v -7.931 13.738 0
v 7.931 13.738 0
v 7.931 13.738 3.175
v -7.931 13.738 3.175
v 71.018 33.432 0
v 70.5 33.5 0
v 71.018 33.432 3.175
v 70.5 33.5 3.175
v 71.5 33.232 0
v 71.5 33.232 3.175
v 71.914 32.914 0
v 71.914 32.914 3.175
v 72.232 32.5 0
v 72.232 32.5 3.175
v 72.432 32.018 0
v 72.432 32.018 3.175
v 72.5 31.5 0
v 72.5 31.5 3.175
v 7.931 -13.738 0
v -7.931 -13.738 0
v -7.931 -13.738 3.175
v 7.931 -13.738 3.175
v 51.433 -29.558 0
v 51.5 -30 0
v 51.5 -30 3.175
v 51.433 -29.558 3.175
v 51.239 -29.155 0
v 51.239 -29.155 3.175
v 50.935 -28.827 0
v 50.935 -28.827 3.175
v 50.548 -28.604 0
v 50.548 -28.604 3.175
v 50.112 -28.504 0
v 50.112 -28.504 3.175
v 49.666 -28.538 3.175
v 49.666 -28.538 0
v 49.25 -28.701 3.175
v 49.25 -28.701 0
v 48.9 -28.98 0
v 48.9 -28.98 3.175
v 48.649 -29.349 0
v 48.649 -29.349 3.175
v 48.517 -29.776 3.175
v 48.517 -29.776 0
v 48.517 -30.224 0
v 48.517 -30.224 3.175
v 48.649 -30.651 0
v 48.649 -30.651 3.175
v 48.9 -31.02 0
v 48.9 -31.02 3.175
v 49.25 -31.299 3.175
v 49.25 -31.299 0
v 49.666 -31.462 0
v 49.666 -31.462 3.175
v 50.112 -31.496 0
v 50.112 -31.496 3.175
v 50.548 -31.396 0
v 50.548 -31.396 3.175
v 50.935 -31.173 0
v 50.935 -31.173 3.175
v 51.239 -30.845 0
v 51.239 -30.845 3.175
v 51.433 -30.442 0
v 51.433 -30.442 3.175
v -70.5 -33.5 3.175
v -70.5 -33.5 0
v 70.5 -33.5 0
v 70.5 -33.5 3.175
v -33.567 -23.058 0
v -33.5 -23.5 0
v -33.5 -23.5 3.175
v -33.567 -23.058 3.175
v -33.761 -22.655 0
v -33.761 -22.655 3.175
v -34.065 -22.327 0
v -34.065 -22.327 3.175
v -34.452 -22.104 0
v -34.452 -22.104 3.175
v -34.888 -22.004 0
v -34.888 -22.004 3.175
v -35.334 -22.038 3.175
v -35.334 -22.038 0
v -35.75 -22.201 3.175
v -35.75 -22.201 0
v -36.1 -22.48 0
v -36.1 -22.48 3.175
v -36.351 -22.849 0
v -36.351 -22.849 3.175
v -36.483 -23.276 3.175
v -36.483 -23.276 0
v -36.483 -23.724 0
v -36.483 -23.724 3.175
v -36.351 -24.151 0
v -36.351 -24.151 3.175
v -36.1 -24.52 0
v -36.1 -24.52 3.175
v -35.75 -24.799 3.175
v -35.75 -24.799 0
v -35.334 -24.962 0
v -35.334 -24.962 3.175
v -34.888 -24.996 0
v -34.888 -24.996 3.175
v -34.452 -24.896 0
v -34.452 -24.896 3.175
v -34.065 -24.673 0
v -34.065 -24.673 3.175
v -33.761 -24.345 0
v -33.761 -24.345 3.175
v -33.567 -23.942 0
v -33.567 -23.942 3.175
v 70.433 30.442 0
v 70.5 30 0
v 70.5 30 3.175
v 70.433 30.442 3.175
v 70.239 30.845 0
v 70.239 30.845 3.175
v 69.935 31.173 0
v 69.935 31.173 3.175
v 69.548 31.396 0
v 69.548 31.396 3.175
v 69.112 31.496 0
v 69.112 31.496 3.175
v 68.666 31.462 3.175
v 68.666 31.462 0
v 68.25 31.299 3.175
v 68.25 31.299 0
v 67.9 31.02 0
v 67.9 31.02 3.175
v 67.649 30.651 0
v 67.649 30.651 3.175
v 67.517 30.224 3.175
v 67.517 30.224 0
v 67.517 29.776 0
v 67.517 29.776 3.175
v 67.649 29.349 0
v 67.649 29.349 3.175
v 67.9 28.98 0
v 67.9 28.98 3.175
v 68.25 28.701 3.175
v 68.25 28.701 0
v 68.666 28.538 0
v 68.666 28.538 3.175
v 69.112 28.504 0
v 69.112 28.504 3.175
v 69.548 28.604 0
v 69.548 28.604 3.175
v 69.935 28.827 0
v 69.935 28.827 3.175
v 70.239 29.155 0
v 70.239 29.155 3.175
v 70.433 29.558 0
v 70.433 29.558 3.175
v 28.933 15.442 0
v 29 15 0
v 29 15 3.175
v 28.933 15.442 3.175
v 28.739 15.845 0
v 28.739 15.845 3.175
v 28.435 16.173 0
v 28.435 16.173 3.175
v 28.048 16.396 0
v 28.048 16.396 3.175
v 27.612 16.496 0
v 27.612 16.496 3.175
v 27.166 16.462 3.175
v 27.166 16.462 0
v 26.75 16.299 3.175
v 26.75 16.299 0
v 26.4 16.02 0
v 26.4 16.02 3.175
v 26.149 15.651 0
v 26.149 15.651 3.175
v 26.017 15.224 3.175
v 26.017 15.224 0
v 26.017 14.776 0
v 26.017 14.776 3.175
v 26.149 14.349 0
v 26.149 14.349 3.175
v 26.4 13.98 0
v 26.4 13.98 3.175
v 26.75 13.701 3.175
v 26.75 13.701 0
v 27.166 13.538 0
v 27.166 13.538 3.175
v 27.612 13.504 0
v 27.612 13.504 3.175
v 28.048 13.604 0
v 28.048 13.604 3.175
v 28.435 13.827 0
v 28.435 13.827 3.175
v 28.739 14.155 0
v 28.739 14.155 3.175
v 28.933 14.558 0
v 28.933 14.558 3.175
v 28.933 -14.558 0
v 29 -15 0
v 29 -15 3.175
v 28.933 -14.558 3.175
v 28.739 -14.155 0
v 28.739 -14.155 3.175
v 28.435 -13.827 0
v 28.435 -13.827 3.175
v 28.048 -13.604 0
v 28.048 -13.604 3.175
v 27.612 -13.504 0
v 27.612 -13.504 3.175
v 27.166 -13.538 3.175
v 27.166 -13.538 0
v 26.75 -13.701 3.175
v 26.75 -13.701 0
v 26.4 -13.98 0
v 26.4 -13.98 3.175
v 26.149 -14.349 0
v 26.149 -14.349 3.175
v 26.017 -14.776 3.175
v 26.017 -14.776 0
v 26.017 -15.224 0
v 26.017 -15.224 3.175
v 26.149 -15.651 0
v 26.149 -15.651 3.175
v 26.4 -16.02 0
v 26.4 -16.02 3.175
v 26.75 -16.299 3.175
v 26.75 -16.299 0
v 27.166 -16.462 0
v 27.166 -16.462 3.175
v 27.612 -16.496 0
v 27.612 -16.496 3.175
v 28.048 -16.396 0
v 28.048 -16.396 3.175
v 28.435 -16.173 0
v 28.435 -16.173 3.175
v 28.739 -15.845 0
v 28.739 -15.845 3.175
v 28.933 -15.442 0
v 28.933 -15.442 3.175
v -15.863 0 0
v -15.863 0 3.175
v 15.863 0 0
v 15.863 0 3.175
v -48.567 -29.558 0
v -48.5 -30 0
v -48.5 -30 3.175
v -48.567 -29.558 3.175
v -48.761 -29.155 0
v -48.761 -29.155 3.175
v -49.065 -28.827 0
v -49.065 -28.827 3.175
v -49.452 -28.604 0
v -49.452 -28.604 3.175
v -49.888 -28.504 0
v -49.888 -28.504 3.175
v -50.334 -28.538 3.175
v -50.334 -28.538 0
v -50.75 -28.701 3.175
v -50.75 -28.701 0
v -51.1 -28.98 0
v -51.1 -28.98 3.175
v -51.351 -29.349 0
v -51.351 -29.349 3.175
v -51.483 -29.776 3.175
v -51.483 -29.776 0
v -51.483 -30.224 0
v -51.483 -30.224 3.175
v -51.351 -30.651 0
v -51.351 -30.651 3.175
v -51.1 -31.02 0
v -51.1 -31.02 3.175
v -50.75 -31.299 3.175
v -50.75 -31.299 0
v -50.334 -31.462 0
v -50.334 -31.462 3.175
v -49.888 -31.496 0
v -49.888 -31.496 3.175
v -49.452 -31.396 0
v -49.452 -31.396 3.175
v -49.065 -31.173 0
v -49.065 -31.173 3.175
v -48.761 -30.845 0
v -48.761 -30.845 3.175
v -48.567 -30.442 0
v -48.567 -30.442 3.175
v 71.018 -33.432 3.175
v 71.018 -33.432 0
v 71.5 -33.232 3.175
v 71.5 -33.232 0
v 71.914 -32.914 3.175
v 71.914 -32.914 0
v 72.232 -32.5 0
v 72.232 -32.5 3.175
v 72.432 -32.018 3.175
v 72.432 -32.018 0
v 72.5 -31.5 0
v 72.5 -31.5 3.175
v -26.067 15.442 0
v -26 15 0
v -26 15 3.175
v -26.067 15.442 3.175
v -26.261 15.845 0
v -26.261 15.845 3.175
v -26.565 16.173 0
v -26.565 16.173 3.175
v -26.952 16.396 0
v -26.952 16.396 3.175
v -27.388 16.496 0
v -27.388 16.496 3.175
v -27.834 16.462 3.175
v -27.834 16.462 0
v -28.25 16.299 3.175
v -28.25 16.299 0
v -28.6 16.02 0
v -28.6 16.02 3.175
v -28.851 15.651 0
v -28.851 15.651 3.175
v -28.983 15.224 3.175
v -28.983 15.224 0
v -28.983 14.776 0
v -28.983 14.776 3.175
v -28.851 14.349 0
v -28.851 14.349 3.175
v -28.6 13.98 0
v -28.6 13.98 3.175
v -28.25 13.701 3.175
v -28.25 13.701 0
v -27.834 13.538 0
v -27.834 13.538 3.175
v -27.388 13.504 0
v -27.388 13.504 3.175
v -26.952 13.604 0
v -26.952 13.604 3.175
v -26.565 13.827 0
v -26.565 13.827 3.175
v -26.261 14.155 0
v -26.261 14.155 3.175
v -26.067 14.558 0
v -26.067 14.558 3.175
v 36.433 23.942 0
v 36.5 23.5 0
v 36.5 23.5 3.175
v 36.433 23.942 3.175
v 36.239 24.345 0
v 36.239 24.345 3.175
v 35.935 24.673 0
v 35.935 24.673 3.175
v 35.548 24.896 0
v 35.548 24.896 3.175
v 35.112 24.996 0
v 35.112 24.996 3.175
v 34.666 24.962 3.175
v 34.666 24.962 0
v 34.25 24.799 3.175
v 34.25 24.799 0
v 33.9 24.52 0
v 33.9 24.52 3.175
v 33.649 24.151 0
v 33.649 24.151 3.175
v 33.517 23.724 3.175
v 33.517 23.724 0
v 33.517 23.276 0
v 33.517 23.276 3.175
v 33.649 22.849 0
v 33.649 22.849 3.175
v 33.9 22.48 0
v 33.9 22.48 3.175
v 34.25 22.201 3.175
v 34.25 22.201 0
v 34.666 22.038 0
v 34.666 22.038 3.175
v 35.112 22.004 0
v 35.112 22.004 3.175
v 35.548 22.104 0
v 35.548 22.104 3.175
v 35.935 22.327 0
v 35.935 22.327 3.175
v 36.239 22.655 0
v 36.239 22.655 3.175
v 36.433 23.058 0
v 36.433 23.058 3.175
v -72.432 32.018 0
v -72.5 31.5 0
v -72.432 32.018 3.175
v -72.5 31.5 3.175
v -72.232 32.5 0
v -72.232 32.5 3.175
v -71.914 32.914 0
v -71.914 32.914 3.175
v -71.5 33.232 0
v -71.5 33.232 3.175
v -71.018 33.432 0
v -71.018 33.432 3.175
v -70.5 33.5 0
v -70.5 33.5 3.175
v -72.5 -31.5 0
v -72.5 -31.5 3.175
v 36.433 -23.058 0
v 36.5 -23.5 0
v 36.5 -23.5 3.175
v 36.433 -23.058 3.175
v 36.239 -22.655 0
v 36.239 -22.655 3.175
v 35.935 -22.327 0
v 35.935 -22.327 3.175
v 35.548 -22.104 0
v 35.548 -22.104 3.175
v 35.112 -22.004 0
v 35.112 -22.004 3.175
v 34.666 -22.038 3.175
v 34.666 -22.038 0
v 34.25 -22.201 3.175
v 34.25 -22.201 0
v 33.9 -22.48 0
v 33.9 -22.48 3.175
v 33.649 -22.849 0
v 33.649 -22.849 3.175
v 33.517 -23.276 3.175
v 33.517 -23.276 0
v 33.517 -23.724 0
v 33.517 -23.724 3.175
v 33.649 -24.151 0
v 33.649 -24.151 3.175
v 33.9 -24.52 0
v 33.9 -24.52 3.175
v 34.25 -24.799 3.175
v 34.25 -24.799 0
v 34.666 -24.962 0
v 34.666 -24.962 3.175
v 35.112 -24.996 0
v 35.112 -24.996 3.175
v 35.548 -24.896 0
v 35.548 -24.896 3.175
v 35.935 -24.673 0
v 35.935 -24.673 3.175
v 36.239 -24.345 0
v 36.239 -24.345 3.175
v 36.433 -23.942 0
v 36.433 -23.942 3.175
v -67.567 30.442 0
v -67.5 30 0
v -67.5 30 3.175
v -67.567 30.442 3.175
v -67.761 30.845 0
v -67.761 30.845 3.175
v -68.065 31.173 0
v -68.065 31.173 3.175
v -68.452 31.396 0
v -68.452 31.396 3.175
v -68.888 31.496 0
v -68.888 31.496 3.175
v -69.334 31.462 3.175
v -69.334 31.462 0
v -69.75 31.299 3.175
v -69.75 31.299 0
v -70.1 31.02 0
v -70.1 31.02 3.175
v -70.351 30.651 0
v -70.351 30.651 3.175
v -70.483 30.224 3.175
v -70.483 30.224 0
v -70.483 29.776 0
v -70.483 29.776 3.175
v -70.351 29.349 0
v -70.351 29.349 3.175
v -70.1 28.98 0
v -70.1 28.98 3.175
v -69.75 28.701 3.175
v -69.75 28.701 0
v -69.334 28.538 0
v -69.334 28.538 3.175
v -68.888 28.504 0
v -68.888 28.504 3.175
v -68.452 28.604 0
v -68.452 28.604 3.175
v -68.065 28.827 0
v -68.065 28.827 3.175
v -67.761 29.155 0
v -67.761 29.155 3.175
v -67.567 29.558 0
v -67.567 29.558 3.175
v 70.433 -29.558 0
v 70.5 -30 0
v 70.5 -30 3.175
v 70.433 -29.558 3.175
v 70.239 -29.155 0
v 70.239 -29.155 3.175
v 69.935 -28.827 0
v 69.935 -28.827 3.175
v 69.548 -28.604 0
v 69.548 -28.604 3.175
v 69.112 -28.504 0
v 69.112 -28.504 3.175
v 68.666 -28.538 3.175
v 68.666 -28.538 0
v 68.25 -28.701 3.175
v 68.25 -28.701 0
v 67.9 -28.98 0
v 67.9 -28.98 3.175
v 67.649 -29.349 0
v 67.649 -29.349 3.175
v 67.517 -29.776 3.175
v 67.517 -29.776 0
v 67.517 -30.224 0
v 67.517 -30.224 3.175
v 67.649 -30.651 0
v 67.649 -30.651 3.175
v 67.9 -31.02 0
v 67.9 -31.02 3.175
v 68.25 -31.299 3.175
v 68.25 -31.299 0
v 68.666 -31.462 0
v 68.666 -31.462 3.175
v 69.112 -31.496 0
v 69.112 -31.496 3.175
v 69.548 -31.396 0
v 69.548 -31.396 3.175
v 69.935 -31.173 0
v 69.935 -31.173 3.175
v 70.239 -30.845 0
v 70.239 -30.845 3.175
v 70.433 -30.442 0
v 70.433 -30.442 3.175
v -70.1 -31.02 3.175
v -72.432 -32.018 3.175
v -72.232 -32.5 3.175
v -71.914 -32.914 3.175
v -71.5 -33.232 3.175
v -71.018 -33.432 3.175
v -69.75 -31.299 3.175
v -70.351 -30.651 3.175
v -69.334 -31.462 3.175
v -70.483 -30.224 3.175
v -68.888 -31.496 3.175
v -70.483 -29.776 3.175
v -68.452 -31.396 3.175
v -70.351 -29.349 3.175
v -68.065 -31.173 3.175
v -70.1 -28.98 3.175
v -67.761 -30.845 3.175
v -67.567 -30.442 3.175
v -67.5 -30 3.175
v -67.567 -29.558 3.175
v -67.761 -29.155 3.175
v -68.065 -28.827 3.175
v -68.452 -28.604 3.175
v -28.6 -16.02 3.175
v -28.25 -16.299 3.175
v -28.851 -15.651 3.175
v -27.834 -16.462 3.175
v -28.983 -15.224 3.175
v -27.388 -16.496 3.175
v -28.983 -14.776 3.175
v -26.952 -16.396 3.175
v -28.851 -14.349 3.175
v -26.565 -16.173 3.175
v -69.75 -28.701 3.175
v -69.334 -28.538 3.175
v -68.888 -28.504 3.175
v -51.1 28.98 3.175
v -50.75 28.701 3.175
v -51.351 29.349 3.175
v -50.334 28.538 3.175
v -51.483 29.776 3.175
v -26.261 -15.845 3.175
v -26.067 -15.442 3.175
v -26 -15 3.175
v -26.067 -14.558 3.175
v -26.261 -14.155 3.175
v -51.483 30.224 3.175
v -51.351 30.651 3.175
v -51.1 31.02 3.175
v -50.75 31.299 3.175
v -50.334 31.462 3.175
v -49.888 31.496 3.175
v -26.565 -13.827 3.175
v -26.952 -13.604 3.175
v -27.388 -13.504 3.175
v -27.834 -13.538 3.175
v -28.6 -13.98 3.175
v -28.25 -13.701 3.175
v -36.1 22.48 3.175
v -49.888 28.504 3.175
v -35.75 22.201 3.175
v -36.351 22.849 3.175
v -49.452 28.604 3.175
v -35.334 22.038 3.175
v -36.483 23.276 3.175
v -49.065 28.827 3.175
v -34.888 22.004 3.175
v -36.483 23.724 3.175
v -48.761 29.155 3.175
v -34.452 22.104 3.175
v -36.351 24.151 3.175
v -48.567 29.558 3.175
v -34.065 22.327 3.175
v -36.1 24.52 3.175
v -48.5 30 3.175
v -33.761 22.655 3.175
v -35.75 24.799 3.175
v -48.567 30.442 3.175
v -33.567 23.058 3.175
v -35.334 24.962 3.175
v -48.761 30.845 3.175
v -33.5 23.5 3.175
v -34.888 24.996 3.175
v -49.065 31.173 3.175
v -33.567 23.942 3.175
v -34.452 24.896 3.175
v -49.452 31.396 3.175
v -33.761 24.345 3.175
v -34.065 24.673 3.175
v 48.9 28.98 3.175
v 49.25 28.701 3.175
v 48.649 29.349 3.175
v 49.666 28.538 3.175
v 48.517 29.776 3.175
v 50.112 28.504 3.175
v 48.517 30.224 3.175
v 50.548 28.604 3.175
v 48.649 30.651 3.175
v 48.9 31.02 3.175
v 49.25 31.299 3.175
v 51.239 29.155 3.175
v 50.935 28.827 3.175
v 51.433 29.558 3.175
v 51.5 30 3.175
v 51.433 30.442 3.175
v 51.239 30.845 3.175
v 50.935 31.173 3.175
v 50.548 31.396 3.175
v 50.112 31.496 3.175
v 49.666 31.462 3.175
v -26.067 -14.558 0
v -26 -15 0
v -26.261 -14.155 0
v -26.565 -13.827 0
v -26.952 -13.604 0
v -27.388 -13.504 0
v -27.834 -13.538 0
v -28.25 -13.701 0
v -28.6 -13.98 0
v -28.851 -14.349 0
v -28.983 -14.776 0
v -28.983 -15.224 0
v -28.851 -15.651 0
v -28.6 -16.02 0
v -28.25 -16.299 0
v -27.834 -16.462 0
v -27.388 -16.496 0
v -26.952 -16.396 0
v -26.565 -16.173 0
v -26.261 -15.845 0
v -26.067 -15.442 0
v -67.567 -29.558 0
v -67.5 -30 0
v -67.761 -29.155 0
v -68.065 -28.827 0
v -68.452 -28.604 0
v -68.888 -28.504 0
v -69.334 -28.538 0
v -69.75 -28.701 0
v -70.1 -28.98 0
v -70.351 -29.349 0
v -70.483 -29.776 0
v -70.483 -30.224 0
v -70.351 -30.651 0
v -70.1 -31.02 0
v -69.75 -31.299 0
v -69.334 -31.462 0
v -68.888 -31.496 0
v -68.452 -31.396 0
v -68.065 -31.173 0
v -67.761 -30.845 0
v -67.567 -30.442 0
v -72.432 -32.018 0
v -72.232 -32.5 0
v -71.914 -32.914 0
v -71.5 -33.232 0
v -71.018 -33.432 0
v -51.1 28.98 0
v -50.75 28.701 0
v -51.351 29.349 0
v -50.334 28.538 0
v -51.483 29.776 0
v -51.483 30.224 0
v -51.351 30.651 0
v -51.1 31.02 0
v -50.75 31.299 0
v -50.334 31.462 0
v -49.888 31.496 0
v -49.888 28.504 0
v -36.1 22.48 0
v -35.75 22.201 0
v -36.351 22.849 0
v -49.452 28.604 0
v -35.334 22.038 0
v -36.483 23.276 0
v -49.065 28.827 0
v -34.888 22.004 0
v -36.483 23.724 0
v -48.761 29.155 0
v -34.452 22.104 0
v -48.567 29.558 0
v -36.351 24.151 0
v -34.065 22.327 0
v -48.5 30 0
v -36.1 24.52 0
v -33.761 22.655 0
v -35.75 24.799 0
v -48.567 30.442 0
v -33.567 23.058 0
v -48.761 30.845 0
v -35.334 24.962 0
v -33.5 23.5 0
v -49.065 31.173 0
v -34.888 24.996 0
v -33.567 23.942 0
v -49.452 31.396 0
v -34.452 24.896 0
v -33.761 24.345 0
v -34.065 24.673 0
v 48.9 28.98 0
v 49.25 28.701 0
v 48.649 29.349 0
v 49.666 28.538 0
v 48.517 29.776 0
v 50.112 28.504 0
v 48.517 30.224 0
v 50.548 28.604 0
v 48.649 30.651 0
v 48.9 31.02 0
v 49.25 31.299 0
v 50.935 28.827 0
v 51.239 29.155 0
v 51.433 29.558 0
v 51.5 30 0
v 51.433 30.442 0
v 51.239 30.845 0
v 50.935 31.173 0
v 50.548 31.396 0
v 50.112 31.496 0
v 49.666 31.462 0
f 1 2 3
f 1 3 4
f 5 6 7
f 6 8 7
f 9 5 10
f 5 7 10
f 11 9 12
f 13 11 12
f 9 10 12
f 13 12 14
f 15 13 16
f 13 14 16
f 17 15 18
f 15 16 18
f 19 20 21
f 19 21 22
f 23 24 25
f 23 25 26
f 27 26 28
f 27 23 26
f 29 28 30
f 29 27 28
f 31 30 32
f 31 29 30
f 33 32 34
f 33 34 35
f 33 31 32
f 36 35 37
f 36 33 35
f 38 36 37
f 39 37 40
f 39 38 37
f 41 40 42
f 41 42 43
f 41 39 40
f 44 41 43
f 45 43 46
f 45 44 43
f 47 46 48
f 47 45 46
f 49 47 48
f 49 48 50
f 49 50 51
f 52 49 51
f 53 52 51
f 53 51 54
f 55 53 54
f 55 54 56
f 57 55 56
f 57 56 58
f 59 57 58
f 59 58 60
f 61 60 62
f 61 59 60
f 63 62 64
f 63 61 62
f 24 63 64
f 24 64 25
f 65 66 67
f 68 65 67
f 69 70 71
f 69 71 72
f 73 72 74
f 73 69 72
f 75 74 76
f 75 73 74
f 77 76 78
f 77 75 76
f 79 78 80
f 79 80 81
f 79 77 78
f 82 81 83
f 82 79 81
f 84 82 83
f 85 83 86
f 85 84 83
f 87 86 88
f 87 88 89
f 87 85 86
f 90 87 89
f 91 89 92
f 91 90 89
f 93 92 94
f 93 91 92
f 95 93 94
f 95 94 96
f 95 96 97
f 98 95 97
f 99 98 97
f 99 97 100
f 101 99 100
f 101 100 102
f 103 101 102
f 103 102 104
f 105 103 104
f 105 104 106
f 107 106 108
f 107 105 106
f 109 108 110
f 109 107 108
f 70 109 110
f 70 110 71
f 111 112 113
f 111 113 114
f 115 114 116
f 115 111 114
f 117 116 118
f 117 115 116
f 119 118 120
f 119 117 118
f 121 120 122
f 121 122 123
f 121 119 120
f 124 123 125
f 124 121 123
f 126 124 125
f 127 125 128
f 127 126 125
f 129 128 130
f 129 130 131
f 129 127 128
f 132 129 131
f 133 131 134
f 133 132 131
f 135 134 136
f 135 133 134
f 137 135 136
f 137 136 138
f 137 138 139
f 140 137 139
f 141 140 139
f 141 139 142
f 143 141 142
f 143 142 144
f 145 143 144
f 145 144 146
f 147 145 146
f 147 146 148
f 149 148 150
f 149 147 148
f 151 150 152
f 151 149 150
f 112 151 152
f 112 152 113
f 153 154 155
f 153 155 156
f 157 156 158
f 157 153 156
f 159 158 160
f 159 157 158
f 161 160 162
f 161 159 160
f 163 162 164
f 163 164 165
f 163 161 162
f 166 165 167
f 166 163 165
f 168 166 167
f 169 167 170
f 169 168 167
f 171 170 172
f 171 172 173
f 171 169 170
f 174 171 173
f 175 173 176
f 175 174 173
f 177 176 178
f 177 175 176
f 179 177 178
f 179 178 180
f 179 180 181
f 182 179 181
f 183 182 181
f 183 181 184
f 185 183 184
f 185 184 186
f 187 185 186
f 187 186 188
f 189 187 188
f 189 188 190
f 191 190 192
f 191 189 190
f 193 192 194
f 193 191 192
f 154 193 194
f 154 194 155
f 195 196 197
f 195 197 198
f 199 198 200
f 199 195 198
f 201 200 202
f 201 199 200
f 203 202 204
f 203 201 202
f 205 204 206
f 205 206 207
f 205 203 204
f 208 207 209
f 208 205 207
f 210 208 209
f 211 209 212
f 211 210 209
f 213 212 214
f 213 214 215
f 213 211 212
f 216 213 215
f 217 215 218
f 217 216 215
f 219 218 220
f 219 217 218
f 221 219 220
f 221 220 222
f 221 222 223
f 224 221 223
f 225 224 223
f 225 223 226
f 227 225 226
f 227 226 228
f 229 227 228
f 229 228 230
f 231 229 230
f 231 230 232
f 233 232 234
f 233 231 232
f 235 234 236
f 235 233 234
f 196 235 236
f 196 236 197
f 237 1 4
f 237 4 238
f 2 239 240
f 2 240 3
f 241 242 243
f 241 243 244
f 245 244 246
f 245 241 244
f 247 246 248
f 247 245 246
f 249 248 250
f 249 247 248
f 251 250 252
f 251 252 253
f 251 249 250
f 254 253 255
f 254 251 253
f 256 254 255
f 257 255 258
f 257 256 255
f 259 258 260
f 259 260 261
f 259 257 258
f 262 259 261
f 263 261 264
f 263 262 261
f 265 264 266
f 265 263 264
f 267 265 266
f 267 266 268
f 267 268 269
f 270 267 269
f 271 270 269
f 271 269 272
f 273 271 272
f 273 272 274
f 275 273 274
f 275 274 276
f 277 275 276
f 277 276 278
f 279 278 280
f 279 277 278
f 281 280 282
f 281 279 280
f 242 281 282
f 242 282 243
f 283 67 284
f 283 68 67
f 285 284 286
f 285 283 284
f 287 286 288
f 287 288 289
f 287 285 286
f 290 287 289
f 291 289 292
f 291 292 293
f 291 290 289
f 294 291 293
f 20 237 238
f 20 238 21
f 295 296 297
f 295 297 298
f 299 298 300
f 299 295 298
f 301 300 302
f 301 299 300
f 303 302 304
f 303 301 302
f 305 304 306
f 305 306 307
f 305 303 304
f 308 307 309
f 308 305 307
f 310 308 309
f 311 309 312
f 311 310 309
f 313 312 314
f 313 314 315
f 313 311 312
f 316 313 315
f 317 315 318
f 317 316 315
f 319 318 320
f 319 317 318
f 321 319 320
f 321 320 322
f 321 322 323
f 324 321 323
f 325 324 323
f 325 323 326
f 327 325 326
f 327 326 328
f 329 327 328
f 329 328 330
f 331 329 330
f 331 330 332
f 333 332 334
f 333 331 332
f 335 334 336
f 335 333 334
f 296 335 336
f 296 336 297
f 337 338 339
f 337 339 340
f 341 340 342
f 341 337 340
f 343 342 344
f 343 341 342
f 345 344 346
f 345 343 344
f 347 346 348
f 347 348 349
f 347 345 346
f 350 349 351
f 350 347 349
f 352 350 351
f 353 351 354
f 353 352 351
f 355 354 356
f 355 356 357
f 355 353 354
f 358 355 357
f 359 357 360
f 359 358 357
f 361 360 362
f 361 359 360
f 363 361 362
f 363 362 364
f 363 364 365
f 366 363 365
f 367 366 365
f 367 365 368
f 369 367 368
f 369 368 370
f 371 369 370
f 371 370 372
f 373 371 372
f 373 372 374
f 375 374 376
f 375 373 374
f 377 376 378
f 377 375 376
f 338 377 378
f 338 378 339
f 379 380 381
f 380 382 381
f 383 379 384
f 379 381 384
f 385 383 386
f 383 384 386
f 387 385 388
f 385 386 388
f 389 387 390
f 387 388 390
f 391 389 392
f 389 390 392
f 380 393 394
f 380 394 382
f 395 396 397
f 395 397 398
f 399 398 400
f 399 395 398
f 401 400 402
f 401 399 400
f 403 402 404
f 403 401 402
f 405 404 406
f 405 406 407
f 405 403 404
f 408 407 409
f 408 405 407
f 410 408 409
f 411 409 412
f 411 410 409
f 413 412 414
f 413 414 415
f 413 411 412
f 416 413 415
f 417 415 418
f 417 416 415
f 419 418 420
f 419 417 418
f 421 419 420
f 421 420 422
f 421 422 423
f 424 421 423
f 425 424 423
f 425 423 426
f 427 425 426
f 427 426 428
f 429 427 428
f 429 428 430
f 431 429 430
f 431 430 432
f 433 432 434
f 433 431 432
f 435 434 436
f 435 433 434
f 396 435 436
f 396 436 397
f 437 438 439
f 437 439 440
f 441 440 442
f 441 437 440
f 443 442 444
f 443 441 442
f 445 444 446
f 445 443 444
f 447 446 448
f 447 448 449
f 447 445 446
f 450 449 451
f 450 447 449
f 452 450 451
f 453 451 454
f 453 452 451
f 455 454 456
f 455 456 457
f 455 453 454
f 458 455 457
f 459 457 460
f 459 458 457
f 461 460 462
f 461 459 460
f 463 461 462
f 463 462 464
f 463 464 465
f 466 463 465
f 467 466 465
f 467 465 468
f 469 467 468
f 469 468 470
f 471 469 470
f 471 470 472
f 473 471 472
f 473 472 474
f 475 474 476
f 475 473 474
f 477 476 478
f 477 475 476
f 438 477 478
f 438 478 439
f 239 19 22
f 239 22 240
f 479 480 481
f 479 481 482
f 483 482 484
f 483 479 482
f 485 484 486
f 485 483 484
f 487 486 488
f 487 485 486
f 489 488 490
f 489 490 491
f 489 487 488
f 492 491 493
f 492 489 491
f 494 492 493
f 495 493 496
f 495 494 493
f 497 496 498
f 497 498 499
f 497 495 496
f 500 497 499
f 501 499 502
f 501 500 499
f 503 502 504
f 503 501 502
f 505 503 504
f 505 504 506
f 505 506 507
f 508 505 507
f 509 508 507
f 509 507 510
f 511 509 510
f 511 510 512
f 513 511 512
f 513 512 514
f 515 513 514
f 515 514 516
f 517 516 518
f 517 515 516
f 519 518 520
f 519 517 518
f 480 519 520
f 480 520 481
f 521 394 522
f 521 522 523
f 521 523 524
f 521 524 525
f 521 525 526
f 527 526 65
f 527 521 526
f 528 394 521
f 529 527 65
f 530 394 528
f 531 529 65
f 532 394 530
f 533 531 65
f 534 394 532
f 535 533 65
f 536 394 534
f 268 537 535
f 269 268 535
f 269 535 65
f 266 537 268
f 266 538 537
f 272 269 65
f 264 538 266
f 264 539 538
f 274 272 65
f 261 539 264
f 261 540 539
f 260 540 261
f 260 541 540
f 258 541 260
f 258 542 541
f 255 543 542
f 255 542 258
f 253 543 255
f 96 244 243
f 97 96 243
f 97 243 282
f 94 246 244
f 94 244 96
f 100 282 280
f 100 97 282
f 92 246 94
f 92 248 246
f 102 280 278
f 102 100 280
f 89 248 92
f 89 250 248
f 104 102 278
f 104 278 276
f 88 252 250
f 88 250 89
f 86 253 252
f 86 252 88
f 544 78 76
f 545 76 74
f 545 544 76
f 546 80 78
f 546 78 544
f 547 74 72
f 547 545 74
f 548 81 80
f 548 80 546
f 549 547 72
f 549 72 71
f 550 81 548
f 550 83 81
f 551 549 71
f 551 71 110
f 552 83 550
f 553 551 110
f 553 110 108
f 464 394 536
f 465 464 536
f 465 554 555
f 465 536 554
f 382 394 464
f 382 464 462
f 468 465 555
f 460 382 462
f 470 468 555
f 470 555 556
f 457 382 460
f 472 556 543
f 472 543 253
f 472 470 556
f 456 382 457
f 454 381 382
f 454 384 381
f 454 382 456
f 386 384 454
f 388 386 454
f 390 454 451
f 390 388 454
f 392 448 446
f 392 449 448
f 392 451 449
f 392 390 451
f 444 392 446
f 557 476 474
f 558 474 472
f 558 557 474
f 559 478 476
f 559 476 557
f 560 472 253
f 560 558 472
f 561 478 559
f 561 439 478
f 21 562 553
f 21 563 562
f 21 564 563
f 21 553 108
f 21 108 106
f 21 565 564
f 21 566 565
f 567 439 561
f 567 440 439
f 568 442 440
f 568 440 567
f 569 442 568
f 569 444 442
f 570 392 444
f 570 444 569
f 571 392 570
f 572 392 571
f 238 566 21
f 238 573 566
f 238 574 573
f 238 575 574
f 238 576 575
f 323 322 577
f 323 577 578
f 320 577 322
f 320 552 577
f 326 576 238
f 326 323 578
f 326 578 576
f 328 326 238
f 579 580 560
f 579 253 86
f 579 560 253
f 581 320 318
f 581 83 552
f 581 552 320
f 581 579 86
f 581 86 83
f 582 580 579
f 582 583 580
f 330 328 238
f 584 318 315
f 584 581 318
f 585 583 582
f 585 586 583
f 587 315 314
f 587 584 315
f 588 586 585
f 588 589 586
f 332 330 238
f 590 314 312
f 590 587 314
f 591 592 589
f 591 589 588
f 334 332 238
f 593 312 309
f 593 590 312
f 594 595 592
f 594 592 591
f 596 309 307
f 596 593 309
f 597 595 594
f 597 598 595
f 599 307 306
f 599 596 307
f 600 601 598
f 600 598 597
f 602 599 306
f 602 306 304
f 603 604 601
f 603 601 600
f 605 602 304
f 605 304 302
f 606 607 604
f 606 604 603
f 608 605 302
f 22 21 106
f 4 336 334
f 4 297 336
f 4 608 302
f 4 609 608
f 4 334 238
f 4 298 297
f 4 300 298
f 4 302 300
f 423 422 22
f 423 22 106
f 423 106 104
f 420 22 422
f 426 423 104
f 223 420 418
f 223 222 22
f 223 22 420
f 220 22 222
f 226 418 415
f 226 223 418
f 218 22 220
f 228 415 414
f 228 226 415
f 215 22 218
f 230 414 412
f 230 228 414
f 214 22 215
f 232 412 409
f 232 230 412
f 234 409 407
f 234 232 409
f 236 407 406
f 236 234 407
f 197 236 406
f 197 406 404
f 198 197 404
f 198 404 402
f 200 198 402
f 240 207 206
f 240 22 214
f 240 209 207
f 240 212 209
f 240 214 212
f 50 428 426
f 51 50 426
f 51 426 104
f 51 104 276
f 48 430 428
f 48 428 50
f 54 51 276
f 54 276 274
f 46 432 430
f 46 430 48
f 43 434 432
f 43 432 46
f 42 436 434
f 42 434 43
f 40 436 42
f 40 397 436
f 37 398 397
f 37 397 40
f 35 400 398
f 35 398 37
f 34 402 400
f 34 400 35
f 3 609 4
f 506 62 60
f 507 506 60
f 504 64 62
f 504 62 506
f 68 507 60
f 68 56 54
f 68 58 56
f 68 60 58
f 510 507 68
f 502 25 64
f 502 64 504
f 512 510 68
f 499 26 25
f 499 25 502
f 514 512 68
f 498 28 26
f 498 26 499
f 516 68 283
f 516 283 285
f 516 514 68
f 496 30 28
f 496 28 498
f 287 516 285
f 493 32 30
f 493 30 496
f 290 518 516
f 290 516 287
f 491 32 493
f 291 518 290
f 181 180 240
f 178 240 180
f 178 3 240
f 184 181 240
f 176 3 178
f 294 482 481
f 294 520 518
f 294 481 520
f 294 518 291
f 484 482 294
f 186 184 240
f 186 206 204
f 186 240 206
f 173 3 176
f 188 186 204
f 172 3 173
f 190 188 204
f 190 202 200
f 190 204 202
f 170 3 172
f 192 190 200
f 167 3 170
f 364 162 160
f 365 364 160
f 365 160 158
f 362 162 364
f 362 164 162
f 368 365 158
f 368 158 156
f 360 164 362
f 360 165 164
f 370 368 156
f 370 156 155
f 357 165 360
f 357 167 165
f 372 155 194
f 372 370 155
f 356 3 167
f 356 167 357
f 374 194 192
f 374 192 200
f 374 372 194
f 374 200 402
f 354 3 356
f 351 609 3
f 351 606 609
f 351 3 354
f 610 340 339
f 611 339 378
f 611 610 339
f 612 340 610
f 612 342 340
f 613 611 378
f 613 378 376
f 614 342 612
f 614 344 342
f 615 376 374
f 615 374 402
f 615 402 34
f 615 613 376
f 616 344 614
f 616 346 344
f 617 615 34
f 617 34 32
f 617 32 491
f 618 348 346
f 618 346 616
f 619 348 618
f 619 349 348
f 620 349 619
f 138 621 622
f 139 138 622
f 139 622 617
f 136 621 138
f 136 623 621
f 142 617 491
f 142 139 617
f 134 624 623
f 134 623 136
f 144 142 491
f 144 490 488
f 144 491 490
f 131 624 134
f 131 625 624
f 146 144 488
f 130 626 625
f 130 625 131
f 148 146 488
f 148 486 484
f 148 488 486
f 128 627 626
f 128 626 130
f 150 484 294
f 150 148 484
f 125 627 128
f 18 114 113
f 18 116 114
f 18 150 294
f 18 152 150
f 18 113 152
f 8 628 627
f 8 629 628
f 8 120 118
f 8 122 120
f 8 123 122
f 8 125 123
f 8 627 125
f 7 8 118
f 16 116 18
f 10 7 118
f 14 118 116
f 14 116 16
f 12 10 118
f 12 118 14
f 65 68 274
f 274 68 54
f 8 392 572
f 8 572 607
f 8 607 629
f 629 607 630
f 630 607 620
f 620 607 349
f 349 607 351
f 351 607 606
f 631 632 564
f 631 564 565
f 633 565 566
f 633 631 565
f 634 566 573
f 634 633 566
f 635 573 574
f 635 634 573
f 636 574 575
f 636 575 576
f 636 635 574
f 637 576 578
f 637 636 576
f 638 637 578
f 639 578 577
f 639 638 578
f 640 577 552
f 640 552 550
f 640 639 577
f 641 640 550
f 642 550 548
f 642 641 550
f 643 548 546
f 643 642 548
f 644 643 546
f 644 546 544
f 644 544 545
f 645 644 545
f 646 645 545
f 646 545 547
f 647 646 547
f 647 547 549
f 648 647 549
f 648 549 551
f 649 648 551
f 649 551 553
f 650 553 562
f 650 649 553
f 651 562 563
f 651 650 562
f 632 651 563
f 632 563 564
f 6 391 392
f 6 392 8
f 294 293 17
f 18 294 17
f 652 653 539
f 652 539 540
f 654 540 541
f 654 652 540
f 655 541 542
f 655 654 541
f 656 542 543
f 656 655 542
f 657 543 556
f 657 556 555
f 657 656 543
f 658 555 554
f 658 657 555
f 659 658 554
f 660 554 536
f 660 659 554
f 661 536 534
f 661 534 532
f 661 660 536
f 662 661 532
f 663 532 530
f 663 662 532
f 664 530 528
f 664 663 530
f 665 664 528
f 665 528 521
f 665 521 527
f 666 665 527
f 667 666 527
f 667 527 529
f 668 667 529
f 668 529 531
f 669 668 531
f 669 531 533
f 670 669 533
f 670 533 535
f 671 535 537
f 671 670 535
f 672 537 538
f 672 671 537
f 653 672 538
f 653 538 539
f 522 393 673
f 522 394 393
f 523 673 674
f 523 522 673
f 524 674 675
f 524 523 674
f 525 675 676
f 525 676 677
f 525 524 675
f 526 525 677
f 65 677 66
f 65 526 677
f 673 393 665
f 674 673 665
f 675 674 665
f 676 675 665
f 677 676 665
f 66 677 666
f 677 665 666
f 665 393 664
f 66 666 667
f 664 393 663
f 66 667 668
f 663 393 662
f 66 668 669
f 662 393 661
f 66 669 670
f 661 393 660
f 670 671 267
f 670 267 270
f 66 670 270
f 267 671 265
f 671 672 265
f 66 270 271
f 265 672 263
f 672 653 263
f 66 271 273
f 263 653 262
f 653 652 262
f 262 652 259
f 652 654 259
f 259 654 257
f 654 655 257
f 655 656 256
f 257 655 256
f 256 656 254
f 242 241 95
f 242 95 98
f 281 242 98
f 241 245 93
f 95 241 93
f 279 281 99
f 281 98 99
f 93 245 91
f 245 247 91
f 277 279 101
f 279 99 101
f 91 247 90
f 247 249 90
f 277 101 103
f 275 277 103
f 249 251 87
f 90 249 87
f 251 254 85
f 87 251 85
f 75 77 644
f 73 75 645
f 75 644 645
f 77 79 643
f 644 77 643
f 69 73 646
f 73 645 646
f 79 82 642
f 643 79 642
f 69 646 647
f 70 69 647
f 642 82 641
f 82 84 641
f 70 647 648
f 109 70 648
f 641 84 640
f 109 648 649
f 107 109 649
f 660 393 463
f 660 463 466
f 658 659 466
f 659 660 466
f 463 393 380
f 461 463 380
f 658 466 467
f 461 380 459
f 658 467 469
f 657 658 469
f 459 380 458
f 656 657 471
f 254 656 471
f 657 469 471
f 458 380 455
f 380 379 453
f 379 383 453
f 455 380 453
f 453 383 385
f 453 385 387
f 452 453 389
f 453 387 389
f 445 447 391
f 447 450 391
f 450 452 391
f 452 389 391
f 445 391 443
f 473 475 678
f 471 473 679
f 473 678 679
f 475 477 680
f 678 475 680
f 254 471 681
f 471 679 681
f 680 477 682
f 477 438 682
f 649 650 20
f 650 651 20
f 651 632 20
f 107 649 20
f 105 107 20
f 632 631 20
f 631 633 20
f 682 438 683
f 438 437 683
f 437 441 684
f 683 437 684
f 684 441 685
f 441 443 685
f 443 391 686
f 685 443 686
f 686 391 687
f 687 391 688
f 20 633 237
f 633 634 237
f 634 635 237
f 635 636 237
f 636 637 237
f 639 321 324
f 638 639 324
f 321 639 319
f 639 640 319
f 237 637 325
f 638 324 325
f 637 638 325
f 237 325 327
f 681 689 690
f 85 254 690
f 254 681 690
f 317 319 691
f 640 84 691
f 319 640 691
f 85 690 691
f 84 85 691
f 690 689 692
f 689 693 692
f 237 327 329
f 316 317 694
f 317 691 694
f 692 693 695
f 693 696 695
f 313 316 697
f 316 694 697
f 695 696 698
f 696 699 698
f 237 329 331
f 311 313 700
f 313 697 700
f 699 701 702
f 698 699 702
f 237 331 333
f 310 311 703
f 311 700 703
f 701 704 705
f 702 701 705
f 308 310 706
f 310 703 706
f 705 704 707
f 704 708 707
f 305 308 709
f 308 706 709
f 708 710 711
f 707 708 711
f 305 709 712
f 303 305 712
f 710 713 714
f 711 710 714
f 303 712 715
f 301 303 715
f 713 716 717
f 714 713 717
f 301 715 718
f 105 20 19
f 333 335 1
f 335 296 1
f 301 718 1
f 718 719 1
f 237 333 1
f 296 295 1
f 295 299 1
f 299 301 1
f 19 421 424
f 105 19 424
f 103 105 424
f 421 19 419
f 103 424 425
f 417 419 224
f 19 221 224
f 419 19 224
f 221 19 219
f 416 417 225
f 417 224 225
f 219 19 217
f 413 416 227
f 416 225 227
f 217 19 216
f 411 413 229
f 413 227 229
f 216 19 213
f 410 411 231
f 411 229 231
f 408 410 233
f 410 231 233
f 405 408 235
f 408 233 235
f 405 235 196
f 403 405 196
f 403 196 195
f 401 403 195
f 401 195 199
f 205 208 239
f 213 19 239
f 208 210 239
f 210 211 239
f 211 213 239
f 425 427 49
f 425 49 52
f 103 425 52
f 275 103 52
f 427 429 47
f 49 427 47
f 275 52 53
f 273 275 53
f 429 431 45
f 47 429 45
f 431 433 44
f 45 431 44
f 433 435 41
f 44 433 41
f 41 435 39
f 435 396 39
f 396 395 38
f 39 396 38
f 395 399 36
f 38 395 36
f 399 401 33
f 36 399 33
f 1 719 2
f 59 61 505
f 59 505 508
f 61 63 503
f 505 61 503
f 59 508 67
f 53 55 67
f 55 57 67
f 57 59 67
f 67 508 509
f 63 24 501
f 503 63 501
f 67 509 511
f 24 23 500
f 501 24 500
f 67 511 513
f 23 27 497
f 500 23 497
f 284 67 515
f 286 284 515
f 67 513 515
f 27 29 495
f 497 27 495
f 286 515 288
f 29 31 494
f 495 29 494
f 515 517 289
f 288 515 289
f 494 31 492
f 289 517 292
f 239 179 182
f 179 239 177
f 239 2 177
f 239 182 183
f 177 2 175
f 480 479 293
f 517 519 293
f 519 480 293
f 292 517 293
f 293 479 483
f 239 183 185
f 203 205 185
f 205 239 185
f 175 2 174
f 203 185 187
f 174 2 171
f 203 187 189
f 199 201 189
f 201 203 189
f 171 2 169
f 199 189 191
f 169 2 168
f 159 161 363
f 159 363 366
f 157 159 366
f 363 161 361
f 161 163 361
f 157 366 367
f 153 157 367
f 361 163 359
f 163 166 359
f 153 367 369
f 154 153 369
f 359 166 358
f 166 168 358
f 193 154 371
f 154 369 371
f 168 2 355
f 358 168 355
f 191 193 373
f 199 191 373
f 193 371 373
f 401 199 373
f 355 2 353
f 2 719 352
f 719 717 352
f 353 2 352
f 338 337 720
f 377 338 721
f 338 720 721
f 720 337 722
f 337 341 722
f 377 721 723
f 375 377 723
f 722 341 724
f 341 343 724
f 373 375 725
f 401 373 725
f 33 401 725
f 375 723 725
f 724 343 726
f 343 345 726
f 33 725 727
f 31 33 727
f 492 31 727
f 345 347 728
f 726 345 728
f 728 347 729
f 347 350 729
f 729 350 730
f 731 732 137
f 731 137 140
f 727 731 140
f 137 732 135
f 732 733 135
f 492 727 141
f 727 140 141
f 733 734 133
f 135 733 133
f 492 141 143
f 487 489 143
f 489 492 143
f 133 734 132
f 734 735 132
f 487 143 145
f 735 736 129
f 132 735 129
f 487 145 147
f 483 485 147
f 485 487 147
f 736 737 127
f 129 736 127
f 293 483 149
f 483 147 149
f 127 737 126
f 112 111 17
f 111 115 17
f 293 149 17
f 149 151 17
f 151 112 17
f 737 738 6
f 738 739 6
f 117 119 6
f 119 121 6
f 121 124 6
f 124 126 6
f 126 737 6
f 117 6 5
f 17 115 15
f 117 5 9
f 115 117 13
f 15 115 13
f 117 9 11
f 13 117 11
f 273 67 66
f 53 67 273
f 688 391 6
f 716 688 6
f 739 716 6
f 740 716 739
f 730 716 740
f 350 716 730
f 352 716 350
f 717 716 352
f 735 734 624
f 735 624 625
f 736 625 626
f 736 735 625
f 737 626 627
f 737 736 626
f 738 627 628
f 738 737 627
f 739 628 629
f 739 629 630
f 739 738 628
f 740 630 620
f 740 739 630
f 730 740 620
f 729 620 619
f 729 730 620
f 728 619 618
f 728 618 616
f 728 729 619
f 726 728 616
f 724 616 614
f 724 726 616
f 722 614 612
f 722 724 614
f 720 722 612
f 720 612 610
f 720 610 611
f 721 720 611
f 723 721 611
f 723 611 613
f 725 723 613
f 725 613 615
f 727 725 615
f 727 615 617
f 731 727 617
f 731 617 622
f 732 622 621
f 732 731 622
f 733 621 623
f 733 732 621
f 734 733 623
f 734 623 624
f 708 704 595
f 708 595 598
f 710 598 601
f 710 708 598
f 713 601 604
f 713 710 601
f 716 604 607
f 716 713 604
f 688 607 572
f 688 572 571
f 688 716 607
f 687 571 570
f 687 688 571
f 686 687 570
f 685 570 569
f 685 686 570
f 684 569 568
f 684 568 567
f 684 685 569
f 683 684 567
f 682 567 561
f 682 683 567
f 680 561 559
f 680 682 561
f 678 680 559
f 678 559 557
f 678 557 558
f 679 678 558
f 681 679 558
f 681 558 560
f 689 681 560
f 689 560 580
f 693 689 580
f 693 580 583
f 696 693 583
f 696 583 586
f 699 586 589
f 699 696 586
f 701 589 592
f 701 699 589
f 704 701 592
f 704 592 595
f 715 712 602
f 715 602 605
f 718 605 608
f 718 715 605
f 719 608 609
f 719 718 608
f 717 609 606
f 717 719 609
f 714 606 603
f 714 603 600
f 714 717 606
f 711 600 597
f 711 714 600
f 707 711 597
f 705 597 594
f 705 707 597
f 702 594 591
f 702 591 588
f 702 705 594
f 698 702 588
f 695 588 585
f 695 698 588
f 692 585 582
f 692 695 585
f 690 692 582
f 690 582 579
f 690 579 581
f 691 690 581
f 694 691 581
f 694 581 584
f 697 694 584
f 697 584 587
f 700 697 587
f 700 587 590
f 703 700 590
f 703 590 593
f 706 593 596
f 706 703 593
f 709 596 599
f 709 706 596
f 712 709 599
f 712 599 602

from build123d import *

# Parameters (mm, degrees)
SKETCH1_W           = 145
SKETCH1_H           = 67
SKETCH1_R           = 1.5
BOSS_EXTRUDE1_DEPTH = 3.175
FILLET2_R           = 2


with BuildPart() as part:
    # Sketch1 → Boss-Extrude1 (new body)
    with BuildSketch(Plane.XY):
        Rectangle(SKETCH1_W, SKETCH1_H)
        with Locations((-35, 23.5)):
            Circle(SKETCH1_R, mode=Mode.SUBTRACT)
        with Locations((35, 23.5)):
            Circle(SKETCH1_R, mode=Mode.SUBTRACT)
        with Locations((35, -23.5)):
            Circle(SKETCH1_R, mode=Mode.SUBTRACT)
        with Locations((-35, -23.5)):
            Circle(SKETCH1_R, mode=Mode.SUBTRACT)
        with Locations((-27.5, 15)):
            Circle(SKETCH1_R, mode=Mode.SUBTRACT)
        with Locations((27.5, 15)):
            Circle(SKETCH1_R, mode=Mode.SUBTRACT)
        with Locations((27.5, -15)):
            Circle(SKETCH1_R, mode=Mode.SUBTRACT)
        with Locations((-27.5, -15)):
            Circle(SKETCH1_R, mode=Mode.SUBTRACT)
        with Locations((-69, 30)):
            Circle(SKETCH1_R, mode=Mode.SUBTRACT)
        with Locations((-50, 30)):
            Circle(SKETCH1_R, mode=Mode.SUBTRACT)
        with Locations((-50, -30)):
            Circle(SKETCH1_R, mode=Mode.SUBTRACT)
        with Locations((-69, -30)):
            Circle(SKETCH1_R, mode=Mode.SUBTRACT)
        with Locations((50, -30)):
            Circle(SKETCH1_R, mode=Mode.SUBTRACT)
        with Locations((69, -30)):
            Circle(SKETCH1_R, mode=Mode.SUBTRACT)
        with Locations((50, 30)):
            Circle(SKETCH1_R, mode=Mode.SUBTRACT)
        with Locations((69, 30)):
            Circle(SKETCH1_R, mode=Mode.SUBTRACT)
        Polygon((15.862719753, 0), (7.931359877, 13.737518279), (-7.931359877, 13.737518279), (-15.862719753, 0), (-7.931359877, -13.737518279), (7.931359877, -13.737518279), align=None, mode=Mode.SUBTRACT)
    extrude(amount=BOSS_EXTRUDE1_DEPTH)

    # Fillet2
    fillet2_edges = [part.edges().sort_by_distance(p)[0] for p in [
        (-72.5, 33.5, 1.5875),
        (72.5, 33.5, 1.5875),
        (72.5, -33.5, 1.5875),
        (-72.5, -33.5, 1.5875),
    ]]
    fillet(fillet2_edges, radius=FILLET2_R)


solid = part.part
